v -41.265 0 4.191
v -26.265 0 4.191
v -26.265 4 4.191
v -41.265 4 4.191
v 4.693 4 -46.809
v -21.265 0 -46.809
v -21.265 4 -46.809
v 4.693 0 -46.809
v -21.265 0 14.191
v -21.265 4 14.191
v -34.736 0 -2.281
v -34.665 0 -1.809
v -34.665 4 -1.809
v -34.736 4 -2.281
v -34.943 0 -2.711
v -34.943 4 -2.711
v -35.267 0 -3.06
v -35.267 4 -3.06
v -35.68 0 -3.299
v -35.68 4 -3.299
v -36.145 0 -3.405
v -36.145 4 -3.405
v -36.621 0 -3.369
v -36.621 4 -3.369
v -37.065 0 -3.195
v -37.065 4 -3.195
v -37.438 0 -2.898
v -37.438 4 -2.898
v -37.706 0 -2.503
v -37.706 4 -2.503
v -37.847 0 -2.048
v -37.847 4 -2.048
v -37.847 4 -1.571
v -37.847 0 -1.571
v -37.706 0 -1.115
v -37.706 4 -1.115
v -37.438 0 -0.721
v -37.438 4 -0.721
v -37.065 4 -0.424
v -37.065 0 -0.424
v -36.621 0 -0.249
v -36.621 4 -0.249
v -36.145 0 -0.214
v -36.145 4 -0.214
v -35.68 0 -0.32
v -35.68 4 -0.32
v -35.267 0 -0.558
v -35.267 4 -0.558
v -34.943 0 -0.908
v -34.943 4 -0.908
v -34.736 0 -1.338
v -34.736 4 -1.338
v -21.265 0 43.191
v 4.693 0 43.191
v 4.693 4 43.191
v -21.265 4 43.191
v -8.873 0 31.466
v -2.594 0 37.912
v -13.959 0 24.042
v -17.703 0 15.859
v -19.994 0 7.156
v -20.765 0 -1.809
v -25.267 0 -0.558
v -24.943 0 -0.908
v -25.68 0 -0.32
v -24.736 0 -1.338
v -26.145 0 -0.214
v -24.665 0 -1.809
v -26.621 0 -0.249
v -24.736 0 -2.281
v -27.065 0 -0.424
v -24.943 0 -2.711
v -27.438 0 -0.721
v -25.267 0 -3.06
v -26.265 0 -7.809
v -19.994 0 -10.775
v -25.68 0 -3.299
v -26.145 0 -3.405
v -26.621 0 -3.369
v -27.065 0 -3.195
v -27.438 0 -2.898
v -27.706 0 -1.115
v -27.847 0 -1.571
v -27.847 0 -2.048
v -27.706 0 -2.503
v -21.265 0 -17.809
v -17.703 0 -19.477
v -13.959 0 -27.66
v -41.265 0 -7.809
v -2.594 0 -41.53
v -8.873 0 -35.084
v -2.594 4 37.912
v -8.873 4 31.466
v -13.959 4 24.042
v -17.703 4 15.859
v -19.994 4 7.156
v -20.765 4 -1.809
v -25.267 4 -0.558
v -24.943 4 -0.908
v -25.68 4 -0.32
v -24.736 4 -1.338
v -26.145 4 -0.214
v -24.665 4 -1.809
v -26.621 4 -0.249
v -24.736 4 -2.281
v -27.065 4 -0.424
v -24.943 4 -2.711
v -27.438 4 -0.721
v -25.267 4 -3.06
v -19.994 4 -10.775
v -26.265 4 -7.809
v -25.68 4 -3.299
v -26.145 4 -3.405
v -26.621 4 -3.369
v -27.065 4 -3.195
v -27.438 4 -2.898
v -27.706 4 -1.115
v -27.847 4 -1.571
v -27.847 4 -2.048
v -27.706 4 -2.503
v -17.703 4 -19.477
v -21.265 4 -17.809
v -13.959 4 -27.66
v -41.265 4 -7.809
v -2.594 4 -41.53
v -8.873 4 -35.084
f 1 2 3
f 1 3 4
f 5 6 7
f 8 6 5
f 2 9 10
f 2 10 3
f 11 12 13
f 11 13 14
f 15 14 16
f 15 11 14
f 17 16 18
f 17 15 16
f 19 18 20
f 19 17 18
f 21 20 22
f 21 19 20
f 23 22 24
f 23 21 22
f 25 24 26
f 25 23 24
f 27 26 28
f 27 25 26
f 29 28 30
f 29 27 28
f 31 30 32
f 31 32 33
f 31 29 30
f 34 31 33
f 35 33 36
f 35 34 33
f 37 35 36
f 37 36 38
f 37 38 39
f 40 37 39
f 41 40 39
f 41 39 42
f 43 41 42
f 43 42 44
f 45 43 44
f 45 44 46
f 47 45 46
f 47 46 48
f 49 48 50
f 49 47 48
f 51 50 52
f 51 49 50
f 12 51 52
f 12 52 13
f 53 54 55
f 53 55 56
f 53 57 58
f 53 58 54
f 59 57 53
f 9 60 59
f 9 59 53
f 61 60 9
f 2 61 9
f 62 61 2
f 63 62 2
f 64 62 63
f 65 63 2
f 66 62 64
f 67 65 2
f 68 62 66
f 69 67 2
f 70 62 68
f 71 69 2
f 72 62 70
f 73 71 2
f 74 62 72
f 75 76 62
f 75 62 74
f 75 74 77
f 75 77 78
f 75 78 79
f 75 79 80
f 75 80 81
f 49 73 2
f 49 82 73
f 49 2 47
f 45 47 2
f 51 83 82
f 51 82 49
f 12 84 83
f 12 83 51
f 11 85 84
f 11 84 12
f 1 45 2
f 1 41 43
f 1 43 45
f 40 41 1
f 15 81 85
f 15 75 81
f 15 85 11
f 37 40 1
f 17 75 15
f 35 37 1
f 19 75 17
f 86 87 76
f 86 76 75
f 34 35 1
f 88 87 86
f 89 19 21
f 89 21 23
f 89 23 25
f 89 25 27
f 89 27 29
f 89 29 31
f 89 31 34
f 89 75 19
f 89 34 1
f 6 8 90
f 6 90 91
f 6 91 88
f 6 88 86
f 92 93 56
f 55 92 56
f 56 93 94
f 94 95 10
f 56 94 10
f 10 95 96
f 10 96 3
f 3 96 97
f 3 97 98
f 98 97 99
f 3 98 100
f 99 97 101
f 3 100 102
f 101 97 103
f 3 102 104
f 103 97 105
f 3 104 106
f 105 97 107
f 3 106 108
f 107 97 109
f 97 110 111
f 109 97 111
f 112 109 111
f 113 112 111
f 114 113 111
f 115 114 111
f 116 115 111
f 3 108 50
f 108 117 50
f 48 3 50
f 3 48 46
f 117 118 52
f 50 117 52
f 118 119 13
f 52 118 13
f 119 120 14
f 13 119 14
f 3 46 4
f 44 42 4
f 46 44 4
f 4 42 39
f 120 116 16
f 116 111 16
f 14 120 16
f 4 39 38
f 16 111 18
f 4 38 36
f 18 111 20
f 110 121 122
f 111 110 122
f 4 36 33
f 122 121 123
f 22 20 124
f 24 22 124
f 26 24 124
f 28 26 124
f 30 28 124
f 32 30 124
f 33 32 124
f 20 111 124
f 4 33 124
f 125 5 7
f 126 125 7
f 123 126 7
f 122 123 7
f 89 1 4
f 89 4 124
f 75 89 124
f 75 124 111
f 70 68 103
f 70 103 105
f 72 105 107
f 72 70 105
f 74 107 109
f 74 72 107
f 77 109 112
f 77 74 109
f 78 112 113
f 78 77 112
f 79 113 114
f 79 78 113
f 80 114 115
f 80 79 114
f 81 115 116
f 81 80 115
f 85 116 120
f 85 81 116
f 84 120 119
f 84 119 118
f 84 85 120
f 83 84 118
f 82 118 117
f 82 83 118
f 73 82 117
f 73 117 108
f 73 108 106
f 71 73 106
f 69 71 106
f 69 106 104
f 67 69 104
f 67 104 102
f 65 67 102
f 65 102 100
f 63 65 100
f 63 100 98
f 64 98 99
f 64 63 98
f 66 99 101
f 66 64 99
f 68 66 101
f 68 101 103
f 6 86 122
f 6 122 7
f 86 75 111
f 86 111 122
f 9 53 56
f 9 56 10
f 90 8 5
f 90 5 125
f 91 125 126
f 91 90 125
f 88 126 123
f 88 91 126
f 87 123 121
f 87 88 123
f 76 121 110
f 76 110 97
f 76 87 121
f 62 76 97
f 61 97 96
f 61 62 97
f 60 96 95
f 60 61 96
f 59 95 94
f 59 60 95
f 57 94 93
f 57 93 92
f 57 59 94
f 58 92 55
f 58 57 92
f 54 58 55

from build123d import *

# Parameters (mm, degrees)
SKETCH_2_R      = 1.6
EXTRUDE_1_DEPTH = 4


with BuildPart() as part:
    # 草图2 → 凸台-拉伸1 (new body)
    with BuildSketch(Plane(origin=(0, 0, 0), x_dir=(1, 0, 0), z_dir=(0, 1, 0))):
        with BuildLine():
            Line((-21.264895519, 46.809256481), (4.693469915, 46.809256481))
            ThreePointArc((4.693469915, 46.809256481), (-20.764895519, 1.809256481), (4.693469915, -43.190743519))
            Line((4.693469915, -43.190743519), (-21.264895519, -43.190743519))
            Line((-21.264895519, -43.190743519), (-21.264895519, -14.190743519))
            Line((-21.264895519, -14.190743519), (-26.264895519, -4.190743519))
            Line((-26.264895519, -4.190743519), (-41.264895519, -4.190743519))
            Line((-41.264895519, -4.190743519), (-41.264895519, 7.809256481))
            Line((-41.264895519, 7.809256481), (-26.264895519, 7.809256481))
            Line((-26.264895519, 7.809256481), (-21.264895519, 17.809256481))
            Line((-21.264895519, 17.809256481), (-21.264895519, 46.809256481))
        make_face()
        with Locations((-36.264895519, 1.809256481)):
            Circle(SKETCH_2_R, mode=Mode.SUBTRACT)
        with Locations((-26.264895519, 1.809256481)):
            Circle(SKETCH_2_R, mode=Mode.SUBTRACT)
    extrude(amount=EXTRUDE_1_DEPTH)


solid = part.part
